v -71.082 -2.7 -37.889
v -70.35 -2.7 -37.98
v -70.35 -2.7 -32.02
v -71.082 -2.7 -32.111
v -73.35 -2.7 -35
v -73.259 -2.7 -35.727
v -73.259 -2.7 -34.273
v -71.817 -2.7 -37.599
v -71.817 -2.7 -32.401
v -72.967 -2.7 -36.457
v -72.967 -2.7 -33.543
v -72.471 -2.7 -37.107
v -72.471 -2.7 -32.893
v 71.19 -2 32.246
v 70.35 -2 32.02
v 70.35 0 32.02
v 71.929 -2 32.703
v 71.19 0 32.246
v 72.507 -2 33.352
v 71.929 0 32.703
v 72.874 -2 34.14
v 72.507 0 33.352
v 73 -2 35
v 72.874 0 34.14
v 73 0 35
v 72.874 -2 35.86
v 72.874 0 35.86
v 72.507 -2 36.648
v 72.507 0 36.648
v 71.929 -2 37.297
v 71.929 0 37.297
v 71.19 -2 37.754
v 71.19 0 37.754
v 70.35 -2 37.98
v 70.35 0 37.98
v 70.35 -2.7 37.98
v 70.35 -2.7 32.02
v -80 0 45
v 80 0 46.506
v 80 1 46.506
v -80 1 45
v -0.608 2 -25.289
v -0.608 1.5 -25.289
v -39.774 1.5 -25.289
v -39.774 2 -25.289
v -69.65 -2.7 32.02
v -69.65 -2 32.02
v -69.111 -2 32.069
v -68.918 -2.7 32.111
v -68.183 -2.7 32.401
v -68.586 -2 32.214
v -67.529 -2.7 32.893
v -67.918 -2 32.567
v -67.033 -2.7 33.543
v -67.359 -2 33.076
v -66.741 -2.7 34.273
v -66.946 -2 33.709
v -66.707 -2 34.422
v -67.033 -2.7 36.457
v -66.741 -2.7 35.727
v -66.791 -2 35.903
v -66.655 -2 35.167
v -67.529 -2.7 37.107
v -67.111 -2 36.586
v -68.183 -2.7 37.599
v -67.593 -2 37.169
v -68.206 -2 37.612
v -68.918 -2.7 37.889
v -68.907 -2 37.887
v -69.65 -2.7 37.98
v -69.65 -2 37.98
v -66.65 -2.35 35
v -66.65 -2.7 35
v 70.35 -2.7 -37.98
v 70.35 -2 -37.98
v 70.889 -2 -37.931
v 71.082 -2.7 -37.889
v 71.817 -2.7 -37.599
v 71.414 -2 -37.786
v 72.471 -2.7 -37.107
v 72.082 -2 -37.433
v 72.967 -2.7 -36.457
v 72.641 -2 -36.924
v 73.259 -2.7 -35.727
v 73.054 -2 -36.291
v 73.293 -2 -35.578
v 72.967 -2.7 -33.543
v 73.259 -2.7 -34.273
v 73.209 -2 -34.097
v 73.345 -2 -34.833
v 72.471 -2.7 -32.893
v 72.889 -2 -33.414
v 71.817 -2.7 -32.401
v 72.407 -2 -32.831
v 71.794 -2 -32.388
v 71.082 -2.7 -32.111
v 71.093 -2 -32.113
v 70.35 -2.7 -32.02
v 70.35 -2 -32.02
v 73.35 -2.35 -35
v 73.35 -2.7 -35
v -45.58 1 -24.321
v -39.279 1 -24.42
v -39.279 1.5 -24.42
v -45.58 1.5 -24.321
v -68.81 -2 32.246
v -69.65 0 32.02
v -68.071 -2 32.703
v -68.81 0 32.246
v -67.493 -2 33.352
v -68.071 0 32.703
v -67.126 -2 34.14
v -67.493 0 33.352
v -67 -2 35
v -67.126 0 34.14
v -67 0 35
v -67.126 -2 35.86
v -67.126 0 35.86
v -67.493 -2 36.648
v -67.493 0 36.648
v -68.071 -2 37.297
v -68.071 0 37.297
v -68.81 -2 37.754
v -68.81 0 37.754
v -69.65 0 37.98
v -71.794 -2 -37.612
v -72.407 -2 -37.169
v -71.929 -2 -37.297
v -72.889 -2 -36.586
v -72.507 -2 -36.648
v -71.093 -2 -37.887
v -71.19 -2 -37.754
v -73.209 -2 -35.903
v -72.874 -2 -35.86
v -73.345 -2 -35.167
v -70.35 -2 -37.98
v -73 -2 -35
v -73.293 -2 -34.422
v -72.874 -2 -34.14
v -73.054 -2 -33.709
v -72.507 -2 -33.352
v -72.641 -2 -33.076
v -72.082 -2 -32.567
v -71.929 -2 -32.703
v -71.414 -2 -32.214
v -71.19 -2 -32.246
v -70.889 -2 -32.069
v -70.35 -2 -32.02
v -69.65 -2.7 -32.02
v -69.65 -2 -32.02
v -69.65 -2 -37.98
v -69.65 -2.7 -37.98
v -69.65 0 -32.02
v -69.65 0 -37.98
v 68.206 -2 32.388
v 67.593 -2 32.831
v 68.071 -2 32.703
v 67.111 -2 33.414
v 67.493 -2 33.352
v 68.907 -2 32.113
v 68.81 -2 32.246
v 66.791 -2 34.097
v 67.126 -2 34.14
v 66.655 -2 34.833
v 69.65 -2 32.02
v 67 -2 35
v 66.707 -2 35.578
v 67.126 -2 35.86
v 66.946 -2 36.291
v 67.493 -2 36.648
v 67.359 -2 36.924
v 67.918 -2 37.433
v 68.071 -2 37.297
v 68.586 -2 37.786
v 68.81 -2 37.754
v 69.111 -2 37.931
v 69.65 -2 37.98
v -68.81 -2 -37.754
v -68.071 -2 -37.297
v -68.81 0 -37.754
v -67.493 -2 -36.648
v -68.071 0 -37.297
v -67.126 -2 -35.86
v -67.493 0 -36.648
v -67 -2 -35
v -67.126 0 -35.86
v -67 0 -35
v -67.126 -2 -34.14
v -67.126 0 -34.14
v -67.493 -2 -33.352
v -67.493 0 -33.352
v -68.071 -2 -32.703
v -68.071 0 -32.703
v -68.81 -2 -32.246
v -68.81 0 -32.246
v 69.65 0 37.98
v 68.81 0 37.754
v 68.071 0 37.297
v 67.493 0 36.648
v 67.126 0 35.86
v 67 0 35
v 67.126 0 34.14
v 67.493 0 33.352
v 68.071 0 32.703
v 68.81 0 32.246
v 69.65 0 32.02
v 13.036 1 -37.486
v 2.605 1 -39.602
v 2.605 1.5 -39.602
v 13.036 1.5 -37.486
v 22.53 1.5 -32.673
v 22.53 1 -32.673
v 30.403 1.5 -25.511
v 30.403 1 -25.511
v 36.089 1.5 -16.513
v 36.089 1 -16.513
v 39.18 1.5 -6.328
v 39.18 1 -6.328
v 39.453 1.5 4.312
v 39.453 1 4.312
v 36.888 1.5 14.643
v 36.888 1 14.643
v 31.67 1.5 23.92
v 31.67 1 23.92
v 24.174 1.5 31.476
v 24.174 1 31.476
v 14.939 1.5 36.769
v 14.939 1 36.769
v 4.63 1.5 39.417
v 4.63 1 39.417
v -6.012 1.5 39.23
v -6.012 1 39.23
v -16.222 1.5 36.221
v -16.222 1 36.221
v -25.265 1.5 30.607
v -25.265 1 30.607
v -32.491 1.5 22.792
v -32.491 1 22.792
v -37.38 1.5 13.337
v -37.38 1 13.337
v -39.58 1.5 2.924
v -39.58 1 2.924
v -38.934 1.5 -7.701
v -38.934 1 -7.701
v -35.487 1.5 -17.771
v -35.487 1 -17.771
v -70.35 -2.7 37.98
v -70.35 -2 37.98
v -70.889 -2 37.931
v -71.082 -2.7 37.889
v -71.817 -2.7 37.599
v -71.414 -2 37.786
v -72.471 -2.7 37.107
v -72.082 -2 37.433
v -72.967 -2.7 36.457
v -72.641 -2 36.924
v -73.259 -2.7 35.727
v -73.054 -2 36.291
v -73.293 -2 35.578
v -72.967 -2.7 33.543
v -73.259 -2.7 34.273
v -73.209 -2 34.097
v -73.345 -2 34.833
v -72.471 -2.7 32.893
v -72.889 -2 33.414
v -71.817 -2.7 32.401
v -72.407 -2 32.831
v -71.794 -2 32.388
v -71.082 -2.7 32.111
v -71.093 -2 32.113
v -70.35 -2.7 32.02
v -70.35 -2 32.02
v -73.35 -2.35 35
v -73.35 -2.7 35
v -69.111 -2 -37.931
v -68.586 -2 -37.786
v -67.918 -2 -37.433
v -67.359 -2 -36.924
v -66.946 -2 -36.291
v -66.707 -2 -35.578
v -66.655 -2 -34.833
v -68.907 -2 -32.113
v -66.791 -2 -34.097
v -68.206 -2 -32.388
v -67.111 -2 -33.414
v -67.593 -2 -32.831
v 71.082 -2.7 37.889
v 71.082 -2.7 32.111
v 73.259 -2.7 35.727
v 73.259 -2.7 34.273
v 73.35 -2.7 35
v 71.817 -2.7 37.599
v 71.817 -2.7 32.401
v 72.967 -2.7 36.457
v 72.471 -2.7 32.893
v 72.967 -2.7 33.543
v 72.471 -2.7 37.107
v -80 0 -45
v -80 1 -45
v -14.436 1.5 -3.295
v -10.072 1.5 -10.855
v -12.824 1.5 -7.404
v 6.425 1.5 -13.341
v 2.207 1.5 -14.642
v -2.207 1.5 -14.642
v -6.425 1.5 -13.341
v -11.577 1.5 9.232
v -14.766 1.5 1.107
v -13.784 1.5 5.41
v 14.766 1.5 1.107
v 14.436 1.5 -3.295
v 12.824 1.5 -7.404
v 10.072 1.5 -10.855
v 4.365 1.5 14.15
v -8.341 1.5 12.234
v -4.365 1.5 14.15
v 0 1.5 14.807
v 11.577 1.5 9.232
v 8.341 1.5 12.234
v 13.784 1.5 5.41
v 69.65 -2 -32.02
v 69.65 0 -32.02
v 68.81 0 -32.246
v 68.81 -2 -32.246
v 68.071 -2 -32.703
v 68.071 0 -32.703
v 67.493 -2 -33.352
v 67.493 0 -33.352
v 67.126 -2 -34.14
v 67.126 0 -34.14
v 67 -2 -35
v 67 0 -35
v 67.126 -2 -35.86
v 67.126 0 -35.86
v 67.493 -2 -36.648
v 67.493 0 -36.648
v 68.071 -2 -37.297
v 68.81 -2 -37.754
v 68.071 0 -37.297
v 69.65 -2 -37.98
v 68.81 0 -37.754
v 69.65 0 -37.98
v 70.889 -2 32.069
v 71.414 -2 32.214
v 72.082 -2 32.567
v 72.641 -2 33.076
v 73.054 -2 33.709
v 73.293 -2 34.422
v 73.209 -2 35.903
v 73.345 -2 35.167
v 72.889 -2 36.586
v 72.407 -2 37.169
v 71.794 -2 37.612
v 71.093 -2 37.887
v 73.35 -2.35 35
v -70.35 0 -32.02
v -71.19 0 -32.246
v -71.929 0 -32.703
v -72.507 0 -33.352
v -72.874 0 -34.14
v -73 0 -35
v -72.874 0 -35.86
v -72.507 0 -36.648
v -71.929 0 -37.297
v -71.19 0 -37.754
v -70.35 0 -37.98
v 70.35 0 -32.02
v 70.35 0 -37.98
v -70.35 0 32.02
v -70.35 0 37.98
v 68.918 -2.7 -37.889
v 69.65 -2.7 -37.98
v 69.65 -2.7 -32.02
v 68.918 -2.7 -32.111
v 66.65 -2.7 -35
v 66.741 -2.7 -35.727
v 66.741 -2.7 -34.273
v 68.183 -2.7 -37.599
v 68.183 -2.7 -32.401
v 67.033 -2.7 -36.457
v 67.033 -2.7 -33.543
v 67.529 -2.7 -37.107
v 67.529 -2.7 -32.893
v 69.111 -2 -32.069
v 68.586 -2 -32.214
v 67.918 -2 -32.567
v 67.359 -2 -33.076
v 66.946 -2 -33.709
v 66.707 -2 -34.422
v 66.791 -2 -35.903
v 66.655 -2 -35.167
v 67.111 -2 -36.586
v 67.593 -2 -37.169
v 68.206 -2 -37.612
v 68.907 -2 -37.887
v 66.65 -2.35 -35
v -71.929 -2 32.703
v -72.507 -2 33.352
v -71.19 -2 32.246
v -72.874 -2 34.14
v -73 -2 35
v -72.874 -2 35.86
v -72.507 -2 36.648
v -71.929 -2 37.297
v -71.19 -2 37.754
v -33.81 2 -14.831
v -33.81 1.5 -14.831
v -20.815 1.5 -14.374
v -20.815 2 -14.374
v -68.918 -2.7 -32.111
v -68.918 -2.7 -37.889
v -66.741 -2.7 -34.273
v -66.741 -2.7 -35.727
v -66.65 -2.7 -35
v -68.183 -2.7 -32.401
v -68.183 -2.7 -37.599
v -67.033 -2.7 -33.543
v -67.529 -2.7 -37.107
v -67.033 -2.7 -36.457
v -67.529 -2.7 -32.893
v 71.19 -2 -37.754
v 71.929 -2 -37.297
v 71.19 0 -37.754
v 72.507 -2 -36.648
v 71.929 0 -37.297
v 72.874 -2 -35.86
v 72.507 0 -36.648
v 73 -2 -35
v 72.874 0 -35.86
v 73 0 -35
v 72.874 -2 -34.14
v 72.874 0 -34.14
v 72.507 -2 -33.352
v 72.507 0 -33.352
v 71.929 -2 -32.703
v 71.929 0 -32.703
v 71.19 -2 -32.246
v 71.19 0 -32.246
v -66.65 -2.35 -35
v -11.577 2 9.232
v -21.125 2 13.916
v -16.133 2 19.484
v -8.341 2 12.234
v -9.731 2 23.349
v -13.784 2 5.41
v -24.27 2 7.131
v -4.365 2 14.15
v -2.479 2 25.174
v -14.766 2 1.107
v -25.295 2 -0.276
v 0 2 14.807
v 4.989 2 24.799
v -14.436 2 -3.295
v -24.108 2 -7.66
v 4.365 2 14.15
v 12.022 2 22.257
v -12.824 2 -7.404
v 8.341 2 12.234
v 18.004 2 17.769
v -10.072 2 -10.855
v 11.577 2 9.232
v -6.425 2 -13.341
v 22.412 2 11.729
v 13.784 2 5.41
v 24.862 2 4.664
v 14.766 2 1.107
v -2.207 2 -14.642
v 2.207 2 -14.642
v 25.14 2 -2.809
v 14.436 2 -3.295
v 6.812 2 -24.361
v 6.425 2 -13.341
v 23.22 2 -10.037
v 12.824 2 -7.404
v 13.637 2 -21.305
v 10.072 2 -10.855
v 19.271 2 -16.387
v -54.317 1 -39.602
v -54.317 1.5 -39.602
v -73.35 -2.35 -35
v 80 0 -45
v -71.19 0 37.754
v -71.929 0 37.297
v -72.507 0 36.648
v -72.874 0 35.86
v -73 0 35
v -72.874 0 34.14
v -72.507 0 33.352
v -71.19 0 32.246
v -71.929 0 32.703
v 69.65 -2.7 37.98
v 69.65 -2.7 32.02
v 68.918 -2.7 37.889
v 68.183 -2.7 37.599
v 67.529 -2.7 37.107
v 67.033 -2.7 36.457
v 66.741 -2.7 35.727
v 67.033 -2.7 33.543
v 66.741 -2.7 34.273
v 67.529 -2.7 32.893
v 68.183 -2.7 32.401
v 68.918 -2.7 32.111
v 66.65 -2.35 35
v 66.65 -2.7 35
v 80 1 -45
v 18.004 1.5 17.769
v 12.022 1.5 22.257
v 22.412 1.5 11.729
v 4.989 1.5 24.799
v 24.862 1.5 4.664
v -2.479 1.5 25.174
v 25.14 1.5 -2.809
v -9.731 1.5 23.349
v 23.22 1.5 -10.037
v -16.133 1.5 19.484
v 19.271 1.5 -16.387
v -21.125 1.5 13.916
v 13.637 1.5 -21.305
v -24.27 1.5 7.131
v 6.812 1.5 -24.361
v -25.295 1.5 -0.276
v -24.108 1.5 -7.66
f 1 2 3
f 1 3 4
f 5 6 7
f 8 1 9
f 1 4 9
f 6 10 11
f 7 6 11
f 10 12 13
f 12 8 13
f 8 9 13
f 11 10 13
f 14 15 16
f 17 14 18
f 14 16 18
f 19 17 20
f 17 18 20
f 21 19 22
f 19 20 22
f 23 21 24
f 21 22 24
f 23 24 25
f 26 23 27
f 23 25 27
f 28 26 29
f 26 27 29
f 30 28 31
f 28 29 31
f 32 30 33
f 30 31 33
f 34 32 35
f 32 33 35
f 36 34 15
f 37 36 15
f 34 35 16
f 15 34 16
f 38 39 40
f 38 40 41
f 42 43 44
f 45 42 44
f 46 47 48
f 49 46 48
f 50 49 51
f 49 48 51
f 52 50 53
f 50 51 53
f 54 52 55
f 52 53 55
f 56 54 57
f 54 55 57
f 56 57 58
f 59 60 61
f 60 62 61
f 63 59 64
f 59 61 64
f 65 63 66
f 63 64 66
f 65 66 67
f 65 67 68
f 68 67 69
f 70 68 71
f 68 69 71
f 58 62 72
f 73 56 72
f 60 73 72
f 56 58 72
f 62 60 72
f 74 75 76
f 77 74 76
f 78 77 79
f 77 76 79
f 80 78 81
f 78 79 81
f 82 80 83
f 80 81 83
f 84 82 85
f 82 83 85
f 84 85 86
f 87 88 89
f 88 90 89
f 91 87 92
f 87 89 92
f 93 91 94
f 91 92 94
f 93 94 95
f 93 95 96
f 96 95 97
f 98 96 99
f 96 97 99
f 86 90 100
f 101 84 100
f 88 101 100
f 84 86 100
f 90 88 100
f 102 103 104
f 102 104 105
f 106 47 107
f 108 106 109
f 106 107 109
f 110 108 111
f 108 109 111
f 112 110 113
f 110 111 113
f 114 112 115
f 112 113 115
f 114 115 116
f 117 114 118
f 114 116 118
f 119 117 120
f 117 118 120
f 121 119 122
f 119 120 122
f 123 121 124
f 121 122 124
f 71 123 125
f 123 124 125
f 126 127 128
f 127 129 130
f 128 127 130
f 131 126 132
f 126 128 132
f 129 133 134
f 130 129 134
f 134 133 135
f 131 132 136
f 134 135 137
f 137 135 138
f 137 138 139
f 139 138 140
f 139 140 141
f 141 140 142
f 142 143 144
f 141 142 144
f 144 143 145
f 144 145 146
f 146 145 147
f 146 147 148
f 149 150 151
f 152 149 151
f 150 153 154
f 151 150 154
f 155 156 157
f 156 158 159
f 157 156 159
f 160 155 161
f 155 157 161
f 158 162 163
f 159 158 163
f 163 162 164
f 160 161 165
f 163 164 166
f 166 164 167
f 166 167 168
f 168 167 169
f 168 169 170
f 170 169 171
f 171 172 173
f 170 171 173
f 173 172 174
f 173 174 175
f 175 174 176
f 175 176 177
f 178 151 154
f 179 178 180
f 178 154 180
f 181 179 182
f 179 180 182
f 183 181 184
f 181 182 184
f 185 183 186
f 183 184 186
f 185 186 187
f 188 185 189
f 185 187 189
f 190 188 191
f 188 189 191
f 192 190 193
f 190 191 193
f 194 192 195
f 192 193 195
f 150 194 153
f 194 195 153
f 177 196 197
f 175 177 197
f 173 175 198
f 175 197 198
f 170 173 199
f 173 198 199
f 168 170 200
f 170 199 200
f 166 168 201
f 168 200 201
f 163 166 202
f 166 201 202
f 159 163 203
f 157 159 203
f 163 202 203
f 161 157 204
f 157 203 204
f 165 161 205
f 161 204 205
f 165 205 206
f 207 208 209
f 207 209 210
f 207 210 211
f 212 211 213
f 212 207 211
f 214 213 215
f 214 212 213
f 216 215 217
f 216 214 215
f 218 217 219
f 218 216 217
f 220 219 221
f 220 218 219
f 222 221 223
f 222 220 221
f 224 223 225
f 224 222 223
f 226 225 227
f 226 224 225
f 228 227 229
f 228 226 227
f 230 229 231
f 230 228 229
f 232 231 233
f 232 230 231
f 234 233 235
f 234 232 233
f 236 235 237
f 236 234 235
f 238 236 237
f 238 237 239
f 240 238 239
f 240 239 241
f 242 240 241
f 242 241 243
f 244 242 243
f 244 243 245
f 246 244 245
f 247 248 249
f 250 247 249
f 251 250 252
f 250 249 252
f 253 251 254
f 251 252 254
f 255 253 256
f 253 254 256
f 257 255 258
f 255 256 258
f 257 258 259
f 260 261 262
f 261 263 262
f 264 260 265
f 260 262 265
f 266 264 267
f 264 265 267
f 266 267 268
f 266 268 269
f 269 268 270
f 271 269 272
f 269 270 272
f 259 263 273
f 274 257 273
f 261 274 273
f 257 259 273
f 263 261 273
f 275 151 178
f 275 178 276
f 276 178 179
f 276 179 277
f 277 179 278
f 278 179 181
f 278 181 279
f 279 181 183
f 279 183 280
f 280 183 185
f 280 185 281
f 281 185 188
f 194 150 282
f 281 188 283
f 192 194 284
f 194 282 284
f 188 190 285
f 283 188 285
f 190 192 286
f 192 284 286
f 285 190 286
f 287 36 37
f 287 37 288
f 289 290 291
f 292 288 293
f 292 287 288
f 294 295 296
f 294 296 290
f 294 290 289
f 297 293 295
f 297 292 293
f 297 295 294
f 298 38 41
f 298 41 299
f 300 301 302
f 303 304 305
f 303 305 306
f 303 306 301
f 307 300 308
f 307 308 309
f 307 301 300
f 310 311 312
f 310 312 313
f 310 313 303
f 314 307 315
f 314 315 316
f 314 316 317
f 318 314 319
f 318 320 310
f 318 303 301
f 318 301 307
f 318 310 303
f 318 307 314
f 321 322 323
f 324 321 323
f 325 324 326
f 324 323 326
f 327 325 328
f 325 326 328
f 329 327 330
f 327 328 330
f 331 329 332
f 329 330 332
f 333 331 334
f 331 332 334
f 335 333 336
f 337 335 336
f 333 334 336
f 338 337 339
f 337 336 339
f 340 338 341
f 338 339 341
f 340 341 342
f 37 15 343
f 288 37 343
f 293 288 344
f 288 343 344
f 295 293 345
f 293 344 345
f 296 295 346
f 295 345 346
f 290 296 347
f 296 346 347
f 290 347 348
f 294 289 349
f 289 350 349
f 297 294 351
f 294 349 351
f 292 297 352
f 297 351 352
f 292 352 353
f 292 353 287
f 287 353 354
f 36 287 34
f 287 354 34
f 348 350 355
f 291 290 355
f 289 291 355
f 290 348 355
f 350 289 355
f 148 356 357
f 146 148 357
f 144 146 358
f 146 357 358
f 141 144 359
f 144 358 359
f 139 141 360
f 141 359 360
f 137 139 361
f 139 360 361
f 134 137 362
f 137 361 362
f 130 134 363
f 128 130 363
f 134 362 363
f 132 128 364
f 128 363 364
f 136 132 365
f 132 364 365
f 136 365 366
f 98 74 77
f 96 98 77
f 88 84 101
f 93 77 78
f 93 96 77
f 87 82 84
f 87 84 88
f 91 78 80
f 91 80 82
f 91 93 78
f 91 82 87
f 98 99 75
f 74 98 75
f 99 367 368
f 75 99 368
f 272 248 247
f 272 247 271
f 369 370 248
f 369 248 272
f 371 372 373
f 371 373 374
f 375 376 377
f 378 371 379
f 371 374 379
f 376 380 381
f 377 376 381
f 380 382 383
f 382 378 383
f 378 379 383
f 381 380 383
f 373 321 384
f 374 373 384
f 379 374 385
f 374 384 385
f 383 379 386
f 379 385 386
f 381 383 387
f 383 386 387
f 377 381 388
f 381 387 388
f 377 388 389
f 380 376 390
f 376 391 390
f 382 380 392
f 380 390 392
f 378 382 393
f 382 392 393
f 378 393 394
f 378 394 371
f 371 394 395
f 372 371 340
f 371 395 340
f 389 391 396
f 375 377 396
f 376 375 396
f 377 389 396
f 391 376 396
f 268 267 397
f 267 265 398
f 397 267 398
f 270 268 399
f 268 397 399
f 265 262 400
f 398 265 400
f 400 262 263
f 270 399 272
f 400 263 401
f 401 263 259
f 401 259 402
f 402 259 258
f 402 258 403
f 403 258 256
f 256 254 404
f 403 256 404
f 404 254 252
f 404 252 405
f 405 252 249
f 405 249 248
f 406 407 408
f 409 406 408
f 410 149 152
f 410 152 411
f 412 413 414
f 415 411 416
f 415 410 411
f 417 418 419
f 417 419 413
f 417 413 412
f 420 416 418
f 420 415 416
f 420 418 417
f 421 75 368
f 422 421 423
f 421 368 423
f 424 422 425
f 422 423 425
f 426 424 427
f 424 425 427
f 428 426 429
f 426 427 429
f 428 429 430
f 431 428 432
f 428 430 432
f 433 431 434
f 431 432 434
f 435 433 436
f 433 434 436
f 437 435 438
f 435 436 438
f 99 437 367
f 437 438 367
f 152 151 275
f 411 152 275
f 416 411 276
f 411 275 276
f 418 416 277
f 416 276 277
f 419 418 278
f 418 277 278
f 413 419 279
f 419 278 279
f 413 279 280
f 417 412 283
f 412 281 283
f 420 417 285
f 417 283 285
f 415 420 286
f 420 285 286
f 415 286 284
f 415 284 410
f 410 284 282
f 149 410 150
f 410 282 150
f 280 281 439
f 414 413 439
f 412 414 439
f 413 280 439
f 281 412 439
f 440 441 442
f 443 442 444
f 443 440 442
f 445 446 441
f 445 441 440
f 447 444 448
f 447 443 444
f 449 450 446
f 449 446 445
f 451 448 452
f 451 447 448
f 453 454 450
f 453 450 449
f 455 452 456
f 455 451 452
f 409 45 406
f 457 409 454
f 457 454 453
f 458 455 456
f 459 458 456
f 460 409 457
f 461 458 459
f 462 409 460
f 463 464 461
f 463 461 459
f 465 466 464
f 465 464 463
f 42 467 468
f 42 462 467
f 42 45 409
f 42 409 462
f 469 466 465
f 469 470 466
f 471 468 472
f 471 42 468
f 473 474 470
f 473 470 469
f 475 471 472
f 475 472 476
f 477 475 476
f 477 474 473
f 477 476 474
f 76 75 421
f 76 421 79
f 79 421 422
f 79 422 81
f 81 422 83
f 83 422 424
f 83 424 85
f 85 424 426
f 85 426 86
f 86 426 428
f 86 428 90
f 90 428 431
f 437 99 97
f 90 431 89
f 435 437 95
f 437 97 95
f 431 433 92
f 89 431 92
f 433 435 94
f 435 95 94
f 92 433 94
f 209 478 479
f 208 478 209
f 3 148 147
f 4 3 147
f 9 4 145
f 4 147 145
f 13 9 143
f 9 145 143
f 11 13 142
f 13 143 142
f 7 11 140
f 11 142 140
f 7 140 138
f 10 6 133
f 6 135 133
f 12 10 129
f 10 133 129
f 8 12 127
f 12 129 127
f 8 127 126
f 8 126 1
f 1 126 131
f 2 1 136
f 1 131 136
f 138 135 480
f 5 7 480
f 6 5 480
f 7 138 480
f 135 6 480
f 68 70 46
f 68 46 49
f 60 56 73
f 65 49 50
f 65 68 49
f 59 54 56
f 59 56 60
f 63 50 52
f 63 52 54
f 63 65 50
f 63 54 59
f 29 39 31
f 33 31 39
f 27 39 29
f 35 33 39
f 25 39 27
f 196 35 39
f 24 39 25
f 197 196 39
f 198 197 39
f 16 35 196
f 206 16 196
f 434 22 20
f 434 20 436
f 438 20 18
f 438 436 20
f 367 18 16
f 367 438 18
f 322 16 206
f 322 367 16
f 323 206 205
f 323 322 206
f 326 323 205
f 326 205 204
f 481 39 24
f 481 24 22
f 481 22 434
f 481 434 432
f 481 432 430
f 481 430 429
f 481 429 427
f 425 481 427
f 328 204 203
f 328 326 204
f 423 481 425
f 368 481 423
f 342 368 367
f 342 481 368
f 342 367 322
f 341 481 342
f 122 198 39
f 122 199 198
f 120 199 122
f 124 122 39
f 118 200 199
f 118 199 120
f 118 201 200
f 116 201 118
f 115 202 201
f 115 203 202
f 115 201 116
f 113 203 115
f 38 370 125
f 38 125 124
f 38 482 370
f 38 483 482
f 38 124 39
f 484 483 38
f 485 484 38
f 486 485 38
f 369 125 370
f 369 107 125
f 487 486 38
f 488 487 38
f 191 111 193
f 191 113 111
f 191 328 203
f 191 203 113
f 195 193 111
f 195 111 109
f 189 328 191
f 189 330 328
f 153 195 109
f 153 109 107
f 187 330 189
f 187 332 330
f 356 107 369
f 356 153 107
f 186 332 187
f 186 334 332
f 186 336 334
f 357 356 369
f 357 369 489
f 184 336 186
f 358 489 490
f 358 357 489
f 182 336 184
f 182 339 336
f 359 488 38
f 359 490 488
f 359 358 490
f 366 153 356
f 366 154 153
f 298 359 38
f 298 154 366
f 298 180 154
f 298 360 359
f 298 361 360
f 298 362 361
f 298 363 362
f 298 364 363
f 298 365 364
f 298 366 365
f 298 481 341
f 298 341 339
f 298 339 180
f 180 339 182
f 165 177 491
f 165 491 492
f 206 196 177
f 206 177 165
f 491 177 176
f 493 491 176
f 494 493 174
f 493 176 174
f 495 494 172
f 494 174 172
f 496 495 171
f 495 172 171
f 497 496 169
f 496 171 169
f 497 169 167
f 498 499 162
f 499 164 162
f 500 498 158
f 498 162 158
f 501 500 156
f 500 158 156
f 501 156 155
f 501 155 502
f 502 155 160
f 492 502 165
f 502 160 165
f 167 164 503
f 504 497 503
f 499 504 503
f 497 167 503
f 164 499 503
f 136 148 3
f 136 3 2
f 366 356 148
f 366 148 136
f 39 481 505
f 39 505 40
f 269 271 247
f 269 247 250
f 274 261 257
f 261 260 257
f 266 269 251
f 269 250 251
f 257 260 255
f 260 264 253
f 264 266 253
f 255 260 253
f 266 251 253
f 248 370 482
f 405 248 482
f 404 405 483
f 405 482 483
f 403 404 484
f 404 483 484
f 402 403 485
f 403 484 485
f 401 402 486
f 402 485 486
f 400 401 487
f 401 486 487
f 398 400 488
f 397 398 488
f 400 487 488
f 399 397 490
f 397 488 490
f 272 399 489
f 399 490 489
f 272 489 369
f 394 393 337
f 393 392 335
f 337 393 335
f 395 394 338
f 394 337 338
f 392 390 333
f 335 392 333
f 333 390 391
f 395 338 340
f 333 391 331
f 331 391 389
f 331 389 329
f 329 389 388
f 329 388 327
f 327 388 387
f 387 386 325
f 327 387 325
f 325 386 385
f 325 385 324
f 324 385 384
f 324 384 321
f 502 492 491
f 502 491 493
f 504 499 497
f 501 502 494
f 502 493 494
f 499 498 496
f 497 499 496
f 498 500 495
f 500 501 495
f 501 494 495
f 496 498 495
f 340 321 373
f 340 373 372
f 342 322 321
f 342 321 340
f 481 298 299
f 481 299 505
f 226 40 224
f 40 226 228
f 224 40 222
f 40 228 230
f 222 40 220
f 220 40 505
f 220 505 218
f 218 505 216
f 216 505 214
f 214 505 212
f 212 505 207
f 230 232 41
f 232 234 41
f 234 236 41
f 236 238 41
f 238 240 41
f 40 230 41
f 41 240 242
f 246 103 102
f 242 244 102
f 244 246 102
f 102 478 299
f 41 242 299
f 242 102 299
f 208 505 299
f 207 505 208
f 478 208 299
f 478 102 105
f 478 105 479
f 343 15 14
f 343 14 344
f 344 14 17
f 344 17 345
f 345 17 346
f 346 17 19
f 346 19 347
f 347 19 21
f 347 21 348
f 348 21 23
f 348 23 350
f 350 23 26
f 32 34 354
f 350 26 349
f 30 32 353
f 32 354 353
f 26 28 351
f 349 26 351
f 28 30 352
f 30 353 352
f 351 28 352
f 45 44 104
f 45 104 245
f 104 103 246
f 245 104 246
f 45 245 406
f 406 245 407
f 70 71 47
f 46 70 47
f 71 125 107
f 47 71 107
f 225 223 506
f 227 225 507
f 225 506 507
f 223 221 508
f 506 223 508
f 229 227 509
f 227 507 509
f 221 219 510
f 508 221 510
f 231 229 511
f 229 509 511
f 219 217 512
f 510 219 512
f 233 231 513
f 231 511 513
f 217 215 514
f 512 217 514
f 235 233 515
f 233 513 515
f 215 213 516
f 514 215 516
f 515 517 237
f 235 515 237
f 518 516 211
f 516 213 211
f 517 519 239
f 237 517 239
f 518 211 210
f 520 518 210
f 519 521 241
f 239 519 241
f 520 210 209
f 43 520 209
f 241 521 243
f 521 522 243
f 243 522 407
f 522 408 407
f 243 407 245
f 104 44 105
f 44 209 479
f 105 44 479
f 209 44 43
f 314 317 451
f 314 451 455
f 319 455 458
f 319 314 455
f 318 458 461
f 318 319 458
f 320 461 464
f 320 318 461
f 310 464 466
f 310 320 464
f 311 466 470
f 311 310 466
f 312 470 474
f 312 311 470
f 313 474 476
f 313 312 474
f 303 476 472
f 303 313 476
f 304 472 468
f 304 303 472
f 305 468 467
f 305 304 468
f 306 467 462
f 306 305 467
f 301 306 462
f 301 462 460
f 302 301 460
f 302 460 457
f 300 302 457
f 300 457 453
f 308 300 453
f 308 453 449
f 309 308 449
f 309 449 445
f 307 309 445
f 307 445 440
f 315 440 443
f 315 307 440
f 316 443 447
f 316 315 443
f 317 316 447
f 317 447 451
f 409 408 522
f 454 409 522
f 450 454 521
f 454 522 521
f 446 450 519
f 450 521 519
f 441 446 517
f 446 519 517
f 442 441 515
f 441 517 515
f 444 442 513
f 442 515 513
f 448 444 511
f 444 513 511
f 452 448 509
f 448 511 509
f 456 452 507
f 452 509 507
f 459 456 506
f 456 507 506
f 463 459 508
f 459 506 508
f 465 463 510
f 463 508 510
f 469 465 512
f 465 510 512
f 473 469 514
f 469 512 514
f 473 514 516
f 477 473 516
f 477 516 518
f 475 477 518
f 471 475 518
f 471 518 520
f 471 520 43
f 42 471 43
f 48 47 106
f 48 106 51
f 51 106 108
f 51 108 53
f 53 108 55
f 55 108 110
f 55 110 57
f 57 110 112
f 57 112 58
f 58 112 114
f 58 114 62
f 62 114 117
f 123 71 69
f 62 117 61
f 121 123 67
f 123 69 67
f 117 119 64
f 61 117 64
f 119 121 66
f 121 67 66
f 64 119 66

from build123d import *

# Parameters (mm, degrees)
BOSS_EXTRUDE1_DEPTH = 1
BOSS_EXTRUDE2_DEPTH = 2.7
SKETCH5_OUTSIDE_W   = 198.872
SKETCH5_OUTSIDE_H   = 130.378
SKETCH5_OUTSIDE_R   = 3
CUT_EXTRUDE1_DEPTH  = 2
BOSS_EXTRUDE3_DEPTH = 0.5
BOSS_EXTRUDE4_DEPTH = 1
CUT_EXTRUDE2_START  = 0.5
SKETCH9_R           = 14.807450978
CUT_EXTRUDE2_DEPTH  = 0.5


with BuildPart() as part:
    # Sketch3 → Boss-Extrude1 (new body)
    with BuildSketch(Plane(origin=(0, 0, 0), x_dir=(1, 0, 0), z_dir=(0, 1, 0))):
        Polygon((-80, 45), (80, 45), (80, -46.505636843), (-80, -45), align=None)
    extrude(amount=BOSS_EXTRUDE1_DEPTH)

    # Sketch4 → Boss-Extrude2 (add)
    with BuildSketch(Plane.XZ):
        with BuildLine():
            Line((-70.35, 37.979513383), (-70.35, 32.020486617))
            add(Edge.make_bspline(
                [(-70.35, 37.979513383), (-73.35, 37.979513383), (-73.35, 35), (-73.35, 32.020486617), (-70.35, 32.020486617)],
                knots=[4.71238898, 4.71238898, 4.71238898, 6.283185307, 6.283185307, 7.853981634, 7.853981634, 7.853981634], degree=2, weights=[1, 0.707106781, 1, 0.707106781, 1]))
        make_face()
        with BuildLine():
            Line((-69.65, 37.979513383), (-69.65, 32.020486617))
            add(Edge.make_bspline(
                [(-69.65, 32.020486617), (-66.65, 32.020486617), (-66.65, 35), (-66.65, 37.979513383), (-69.65, 37.979513383)],
                knots=[4.71238898, 4.71238898, 4.71238898, 6.283185307, 6.283185307, 7.853981634, 7.853981634, 7.853981634], degree=2, weights=[1, 0.707106781, 1, 0.707106781, 1]))
        make_face()
        with BuildLine():
            Line((69.65, 37.979513383), (69.65, 32.020486617))
            add(Edge.make_bspline(
                [(69.65, 37.979513383), (66.65, 37.979513383), (66.65, 35), (66.65, 32.020486617), (69.65, 32.020486617)],
                knots=[4.71238898, 4.71238898, 4.71238898, 6.283185307, 6.283185307, 7.853981634, 7.853981634, 7.853981634], degree=2, weights=[1, 0.707106781, 1, 0.707106781, 1]))
        make_face()
        with BuildLine():
            Line((70.35, 37.979513383), (70.35, 32.020486617))
            add(Edge.make_bspline(
                [(70.35, 32.020486617), (73.35, 32.020486617), (73.35, 35), (73.35, 37.979513383), (70.35, 37.979513383)],
                knots=[4.71238898, 4.71238898, 4.71238898, 6.283185307, 6.283185307, 7.853981634, 7.853981634, 7.853981634], degree=2, weights=[1, 0.707106781, 1, 0.707106781, 1]))
        make_face()
        with BuildLine():
            Line((69.65, -32.020486617), (69.65, -37.979513383))
            add(Edge.make_bspline(
                [(69.65, -32.020486617), (66.65, -32.020486617), (66.65, -35), (66.65, -37.979513383), (69.65, -37.979513383)],
                knots=[4.71238898, 4.71238898, 4.71238898, 6.283185307, 6.283185307, 7.853981634, 7.853981634, 7.853981634], degree=2, weights=[1, 0.707106781, 1, 0.707106781, 1]))
        make_face()
        with BuildLine():
            Line((70.35, -32.020486617), (70.35, -37.979513383))
            add(Edge.make_bspline(
                [(70.35, -37.979513383), (73.35, -37.979513383), (73.35, -35), (73.35, -32.020486617), (70.35, -32.020486617)],
                knots=[4.71238898, 4.71238898, 4.71238898, 6.283185307, 6.283185307, 7.853981634, 7.853981634, 7.853981634], degree=2, weights=[1, 0.707106781, 1, 0.707106781, 1]))
        make_face()
        with BuildLine():
            Line((-70.35, -32.020486617), (-70.35, -37.979513383))
            add(Edge.make_bspline(
                [(-70.35, -32.020486617), (-73.35, -32.020486617), (-73.35, -35), (-73.35, -37.979513383), (-70.35, -37.979513383)],
                knots=[4.71238898, 4.71238898, 4.71238898, 6.283185307, 6.283185307, 7.853981634, 7.853981634, 7.853981634], degree=2, weights=[1, 0.707106781, 1, 0.707106781, 1]))
        make_face()
        with BuildLine():
            Line((-69.65, -32.020486617), (-69.65, -37.979513383))
            add(Edge.make_bspline(
                [(-69.65, -37.979513383), (-66.65, -37.979513383), (-66.65, -35), (-66.65, -32.020486617), (-69.65, -32.020486617)],
                knots=[4.71238898, 4.71238898, 4.71238898, 6.283185307, 6.283185307, 7.853981634, 7.853981634, 7.853981634], degree=2, weights=[1, 0.707106781, 1, 0.707106781, 1]))
        make_face()
    extrude(amount=BOSS_EXTRUDE2_DEPTH)

    # Sketch5 outside → Cut-Extrude1 (cut)
    with BuildSketch(Plane.XZ):
        with Locations((0, 0.753)):
            Rectangle(SKETCH5_OUTSIDE_W, SKETCH5_OUTSIDE_H)
        with Locations((-70, 35)):
            Circle(SKETCH5_OUTSIDE_R, mode=Mode.SUBTRACT)
        with Locations((70, 35)):
            Circle(SKETCH5_OUTSIDE_R, mode=Mode.SUBTRACT)
        with Locations((70, -35)):
            Circle(SKETCH5_OUTSIDE_R, mode=Mode.SUBTRACT)
        with Locations((-70, -35)):
            Circle(SKETCH5_OUTSIDE_R, mode=Mode.SUBTRACT)
    extrude(amount=CUT_EXTRUDE1_DEPTH, mode=Mode.SUBTRACT)

    # Sketch7 → Boss-Extrude3 (add)
    with BuildSketch(Plane(origin=(0, 1, 0), x_dir=(1, 0, 0), z_dir=(0, 1, 0))):
        with BuildLine():
            Line((-54.317045104, 39.602220595), (2.604668629, 39.602220595))
            ThreePointArc((2.604668629, 39.602220595), (16.151568109, -36.252545046), (-31.185365289, 24.547773147))
            Line((-31.185365289, 24.547773147), (-45.57985147, 24.320826837))
            Line((-45.57985147, 24.320826837), (-54.317045104, 39.602220595))
        make_face()
    extrude(amount=BOSS_EXTRUDE3_DEPTH)

    # Sketch8 → Boss-Extrude4 (add)
    with BuildSketch(Plane(origin=(0, 1, 0), x_dir=(1, 0, 0), z_dir=(0, 1, 0))):
        with BuildLine():
            Line((-39.773980052, 25.288720826), (-33.810282359, 14.830937097))
            Line((-33.810282359, 14.830937097), (-20.815447328, 14.373801562))
            ThreePointArc((-20.815447328, 14.373801562), (12.021833569, -22.256786301), (-0.607961992, 25.288720826))
            Line((-0.607961992, 25.288720826), (-39.773980052, 25.288720826))
        make_face()
    extrude(amount=BOSS_EXTRUDE4_DEPTH)

    # Sketch9 → Cut-Extrude2 (cut)
    with BuildSketch(Plane(origin=(0, 1, 0), x_dir=(1, 0, 0), z_dir=(0, 1, 0)).offset(CUT_EXTRUDE2_START)):
        with Locations(Location((0, 0, 0), (0, 0, 270))):
            Circle(SKETCH9_R)
    extrude(amount=CUT_EXTRUDE2_DEPTH, mode=Mode.SUBTRACT)


solid = part.part
